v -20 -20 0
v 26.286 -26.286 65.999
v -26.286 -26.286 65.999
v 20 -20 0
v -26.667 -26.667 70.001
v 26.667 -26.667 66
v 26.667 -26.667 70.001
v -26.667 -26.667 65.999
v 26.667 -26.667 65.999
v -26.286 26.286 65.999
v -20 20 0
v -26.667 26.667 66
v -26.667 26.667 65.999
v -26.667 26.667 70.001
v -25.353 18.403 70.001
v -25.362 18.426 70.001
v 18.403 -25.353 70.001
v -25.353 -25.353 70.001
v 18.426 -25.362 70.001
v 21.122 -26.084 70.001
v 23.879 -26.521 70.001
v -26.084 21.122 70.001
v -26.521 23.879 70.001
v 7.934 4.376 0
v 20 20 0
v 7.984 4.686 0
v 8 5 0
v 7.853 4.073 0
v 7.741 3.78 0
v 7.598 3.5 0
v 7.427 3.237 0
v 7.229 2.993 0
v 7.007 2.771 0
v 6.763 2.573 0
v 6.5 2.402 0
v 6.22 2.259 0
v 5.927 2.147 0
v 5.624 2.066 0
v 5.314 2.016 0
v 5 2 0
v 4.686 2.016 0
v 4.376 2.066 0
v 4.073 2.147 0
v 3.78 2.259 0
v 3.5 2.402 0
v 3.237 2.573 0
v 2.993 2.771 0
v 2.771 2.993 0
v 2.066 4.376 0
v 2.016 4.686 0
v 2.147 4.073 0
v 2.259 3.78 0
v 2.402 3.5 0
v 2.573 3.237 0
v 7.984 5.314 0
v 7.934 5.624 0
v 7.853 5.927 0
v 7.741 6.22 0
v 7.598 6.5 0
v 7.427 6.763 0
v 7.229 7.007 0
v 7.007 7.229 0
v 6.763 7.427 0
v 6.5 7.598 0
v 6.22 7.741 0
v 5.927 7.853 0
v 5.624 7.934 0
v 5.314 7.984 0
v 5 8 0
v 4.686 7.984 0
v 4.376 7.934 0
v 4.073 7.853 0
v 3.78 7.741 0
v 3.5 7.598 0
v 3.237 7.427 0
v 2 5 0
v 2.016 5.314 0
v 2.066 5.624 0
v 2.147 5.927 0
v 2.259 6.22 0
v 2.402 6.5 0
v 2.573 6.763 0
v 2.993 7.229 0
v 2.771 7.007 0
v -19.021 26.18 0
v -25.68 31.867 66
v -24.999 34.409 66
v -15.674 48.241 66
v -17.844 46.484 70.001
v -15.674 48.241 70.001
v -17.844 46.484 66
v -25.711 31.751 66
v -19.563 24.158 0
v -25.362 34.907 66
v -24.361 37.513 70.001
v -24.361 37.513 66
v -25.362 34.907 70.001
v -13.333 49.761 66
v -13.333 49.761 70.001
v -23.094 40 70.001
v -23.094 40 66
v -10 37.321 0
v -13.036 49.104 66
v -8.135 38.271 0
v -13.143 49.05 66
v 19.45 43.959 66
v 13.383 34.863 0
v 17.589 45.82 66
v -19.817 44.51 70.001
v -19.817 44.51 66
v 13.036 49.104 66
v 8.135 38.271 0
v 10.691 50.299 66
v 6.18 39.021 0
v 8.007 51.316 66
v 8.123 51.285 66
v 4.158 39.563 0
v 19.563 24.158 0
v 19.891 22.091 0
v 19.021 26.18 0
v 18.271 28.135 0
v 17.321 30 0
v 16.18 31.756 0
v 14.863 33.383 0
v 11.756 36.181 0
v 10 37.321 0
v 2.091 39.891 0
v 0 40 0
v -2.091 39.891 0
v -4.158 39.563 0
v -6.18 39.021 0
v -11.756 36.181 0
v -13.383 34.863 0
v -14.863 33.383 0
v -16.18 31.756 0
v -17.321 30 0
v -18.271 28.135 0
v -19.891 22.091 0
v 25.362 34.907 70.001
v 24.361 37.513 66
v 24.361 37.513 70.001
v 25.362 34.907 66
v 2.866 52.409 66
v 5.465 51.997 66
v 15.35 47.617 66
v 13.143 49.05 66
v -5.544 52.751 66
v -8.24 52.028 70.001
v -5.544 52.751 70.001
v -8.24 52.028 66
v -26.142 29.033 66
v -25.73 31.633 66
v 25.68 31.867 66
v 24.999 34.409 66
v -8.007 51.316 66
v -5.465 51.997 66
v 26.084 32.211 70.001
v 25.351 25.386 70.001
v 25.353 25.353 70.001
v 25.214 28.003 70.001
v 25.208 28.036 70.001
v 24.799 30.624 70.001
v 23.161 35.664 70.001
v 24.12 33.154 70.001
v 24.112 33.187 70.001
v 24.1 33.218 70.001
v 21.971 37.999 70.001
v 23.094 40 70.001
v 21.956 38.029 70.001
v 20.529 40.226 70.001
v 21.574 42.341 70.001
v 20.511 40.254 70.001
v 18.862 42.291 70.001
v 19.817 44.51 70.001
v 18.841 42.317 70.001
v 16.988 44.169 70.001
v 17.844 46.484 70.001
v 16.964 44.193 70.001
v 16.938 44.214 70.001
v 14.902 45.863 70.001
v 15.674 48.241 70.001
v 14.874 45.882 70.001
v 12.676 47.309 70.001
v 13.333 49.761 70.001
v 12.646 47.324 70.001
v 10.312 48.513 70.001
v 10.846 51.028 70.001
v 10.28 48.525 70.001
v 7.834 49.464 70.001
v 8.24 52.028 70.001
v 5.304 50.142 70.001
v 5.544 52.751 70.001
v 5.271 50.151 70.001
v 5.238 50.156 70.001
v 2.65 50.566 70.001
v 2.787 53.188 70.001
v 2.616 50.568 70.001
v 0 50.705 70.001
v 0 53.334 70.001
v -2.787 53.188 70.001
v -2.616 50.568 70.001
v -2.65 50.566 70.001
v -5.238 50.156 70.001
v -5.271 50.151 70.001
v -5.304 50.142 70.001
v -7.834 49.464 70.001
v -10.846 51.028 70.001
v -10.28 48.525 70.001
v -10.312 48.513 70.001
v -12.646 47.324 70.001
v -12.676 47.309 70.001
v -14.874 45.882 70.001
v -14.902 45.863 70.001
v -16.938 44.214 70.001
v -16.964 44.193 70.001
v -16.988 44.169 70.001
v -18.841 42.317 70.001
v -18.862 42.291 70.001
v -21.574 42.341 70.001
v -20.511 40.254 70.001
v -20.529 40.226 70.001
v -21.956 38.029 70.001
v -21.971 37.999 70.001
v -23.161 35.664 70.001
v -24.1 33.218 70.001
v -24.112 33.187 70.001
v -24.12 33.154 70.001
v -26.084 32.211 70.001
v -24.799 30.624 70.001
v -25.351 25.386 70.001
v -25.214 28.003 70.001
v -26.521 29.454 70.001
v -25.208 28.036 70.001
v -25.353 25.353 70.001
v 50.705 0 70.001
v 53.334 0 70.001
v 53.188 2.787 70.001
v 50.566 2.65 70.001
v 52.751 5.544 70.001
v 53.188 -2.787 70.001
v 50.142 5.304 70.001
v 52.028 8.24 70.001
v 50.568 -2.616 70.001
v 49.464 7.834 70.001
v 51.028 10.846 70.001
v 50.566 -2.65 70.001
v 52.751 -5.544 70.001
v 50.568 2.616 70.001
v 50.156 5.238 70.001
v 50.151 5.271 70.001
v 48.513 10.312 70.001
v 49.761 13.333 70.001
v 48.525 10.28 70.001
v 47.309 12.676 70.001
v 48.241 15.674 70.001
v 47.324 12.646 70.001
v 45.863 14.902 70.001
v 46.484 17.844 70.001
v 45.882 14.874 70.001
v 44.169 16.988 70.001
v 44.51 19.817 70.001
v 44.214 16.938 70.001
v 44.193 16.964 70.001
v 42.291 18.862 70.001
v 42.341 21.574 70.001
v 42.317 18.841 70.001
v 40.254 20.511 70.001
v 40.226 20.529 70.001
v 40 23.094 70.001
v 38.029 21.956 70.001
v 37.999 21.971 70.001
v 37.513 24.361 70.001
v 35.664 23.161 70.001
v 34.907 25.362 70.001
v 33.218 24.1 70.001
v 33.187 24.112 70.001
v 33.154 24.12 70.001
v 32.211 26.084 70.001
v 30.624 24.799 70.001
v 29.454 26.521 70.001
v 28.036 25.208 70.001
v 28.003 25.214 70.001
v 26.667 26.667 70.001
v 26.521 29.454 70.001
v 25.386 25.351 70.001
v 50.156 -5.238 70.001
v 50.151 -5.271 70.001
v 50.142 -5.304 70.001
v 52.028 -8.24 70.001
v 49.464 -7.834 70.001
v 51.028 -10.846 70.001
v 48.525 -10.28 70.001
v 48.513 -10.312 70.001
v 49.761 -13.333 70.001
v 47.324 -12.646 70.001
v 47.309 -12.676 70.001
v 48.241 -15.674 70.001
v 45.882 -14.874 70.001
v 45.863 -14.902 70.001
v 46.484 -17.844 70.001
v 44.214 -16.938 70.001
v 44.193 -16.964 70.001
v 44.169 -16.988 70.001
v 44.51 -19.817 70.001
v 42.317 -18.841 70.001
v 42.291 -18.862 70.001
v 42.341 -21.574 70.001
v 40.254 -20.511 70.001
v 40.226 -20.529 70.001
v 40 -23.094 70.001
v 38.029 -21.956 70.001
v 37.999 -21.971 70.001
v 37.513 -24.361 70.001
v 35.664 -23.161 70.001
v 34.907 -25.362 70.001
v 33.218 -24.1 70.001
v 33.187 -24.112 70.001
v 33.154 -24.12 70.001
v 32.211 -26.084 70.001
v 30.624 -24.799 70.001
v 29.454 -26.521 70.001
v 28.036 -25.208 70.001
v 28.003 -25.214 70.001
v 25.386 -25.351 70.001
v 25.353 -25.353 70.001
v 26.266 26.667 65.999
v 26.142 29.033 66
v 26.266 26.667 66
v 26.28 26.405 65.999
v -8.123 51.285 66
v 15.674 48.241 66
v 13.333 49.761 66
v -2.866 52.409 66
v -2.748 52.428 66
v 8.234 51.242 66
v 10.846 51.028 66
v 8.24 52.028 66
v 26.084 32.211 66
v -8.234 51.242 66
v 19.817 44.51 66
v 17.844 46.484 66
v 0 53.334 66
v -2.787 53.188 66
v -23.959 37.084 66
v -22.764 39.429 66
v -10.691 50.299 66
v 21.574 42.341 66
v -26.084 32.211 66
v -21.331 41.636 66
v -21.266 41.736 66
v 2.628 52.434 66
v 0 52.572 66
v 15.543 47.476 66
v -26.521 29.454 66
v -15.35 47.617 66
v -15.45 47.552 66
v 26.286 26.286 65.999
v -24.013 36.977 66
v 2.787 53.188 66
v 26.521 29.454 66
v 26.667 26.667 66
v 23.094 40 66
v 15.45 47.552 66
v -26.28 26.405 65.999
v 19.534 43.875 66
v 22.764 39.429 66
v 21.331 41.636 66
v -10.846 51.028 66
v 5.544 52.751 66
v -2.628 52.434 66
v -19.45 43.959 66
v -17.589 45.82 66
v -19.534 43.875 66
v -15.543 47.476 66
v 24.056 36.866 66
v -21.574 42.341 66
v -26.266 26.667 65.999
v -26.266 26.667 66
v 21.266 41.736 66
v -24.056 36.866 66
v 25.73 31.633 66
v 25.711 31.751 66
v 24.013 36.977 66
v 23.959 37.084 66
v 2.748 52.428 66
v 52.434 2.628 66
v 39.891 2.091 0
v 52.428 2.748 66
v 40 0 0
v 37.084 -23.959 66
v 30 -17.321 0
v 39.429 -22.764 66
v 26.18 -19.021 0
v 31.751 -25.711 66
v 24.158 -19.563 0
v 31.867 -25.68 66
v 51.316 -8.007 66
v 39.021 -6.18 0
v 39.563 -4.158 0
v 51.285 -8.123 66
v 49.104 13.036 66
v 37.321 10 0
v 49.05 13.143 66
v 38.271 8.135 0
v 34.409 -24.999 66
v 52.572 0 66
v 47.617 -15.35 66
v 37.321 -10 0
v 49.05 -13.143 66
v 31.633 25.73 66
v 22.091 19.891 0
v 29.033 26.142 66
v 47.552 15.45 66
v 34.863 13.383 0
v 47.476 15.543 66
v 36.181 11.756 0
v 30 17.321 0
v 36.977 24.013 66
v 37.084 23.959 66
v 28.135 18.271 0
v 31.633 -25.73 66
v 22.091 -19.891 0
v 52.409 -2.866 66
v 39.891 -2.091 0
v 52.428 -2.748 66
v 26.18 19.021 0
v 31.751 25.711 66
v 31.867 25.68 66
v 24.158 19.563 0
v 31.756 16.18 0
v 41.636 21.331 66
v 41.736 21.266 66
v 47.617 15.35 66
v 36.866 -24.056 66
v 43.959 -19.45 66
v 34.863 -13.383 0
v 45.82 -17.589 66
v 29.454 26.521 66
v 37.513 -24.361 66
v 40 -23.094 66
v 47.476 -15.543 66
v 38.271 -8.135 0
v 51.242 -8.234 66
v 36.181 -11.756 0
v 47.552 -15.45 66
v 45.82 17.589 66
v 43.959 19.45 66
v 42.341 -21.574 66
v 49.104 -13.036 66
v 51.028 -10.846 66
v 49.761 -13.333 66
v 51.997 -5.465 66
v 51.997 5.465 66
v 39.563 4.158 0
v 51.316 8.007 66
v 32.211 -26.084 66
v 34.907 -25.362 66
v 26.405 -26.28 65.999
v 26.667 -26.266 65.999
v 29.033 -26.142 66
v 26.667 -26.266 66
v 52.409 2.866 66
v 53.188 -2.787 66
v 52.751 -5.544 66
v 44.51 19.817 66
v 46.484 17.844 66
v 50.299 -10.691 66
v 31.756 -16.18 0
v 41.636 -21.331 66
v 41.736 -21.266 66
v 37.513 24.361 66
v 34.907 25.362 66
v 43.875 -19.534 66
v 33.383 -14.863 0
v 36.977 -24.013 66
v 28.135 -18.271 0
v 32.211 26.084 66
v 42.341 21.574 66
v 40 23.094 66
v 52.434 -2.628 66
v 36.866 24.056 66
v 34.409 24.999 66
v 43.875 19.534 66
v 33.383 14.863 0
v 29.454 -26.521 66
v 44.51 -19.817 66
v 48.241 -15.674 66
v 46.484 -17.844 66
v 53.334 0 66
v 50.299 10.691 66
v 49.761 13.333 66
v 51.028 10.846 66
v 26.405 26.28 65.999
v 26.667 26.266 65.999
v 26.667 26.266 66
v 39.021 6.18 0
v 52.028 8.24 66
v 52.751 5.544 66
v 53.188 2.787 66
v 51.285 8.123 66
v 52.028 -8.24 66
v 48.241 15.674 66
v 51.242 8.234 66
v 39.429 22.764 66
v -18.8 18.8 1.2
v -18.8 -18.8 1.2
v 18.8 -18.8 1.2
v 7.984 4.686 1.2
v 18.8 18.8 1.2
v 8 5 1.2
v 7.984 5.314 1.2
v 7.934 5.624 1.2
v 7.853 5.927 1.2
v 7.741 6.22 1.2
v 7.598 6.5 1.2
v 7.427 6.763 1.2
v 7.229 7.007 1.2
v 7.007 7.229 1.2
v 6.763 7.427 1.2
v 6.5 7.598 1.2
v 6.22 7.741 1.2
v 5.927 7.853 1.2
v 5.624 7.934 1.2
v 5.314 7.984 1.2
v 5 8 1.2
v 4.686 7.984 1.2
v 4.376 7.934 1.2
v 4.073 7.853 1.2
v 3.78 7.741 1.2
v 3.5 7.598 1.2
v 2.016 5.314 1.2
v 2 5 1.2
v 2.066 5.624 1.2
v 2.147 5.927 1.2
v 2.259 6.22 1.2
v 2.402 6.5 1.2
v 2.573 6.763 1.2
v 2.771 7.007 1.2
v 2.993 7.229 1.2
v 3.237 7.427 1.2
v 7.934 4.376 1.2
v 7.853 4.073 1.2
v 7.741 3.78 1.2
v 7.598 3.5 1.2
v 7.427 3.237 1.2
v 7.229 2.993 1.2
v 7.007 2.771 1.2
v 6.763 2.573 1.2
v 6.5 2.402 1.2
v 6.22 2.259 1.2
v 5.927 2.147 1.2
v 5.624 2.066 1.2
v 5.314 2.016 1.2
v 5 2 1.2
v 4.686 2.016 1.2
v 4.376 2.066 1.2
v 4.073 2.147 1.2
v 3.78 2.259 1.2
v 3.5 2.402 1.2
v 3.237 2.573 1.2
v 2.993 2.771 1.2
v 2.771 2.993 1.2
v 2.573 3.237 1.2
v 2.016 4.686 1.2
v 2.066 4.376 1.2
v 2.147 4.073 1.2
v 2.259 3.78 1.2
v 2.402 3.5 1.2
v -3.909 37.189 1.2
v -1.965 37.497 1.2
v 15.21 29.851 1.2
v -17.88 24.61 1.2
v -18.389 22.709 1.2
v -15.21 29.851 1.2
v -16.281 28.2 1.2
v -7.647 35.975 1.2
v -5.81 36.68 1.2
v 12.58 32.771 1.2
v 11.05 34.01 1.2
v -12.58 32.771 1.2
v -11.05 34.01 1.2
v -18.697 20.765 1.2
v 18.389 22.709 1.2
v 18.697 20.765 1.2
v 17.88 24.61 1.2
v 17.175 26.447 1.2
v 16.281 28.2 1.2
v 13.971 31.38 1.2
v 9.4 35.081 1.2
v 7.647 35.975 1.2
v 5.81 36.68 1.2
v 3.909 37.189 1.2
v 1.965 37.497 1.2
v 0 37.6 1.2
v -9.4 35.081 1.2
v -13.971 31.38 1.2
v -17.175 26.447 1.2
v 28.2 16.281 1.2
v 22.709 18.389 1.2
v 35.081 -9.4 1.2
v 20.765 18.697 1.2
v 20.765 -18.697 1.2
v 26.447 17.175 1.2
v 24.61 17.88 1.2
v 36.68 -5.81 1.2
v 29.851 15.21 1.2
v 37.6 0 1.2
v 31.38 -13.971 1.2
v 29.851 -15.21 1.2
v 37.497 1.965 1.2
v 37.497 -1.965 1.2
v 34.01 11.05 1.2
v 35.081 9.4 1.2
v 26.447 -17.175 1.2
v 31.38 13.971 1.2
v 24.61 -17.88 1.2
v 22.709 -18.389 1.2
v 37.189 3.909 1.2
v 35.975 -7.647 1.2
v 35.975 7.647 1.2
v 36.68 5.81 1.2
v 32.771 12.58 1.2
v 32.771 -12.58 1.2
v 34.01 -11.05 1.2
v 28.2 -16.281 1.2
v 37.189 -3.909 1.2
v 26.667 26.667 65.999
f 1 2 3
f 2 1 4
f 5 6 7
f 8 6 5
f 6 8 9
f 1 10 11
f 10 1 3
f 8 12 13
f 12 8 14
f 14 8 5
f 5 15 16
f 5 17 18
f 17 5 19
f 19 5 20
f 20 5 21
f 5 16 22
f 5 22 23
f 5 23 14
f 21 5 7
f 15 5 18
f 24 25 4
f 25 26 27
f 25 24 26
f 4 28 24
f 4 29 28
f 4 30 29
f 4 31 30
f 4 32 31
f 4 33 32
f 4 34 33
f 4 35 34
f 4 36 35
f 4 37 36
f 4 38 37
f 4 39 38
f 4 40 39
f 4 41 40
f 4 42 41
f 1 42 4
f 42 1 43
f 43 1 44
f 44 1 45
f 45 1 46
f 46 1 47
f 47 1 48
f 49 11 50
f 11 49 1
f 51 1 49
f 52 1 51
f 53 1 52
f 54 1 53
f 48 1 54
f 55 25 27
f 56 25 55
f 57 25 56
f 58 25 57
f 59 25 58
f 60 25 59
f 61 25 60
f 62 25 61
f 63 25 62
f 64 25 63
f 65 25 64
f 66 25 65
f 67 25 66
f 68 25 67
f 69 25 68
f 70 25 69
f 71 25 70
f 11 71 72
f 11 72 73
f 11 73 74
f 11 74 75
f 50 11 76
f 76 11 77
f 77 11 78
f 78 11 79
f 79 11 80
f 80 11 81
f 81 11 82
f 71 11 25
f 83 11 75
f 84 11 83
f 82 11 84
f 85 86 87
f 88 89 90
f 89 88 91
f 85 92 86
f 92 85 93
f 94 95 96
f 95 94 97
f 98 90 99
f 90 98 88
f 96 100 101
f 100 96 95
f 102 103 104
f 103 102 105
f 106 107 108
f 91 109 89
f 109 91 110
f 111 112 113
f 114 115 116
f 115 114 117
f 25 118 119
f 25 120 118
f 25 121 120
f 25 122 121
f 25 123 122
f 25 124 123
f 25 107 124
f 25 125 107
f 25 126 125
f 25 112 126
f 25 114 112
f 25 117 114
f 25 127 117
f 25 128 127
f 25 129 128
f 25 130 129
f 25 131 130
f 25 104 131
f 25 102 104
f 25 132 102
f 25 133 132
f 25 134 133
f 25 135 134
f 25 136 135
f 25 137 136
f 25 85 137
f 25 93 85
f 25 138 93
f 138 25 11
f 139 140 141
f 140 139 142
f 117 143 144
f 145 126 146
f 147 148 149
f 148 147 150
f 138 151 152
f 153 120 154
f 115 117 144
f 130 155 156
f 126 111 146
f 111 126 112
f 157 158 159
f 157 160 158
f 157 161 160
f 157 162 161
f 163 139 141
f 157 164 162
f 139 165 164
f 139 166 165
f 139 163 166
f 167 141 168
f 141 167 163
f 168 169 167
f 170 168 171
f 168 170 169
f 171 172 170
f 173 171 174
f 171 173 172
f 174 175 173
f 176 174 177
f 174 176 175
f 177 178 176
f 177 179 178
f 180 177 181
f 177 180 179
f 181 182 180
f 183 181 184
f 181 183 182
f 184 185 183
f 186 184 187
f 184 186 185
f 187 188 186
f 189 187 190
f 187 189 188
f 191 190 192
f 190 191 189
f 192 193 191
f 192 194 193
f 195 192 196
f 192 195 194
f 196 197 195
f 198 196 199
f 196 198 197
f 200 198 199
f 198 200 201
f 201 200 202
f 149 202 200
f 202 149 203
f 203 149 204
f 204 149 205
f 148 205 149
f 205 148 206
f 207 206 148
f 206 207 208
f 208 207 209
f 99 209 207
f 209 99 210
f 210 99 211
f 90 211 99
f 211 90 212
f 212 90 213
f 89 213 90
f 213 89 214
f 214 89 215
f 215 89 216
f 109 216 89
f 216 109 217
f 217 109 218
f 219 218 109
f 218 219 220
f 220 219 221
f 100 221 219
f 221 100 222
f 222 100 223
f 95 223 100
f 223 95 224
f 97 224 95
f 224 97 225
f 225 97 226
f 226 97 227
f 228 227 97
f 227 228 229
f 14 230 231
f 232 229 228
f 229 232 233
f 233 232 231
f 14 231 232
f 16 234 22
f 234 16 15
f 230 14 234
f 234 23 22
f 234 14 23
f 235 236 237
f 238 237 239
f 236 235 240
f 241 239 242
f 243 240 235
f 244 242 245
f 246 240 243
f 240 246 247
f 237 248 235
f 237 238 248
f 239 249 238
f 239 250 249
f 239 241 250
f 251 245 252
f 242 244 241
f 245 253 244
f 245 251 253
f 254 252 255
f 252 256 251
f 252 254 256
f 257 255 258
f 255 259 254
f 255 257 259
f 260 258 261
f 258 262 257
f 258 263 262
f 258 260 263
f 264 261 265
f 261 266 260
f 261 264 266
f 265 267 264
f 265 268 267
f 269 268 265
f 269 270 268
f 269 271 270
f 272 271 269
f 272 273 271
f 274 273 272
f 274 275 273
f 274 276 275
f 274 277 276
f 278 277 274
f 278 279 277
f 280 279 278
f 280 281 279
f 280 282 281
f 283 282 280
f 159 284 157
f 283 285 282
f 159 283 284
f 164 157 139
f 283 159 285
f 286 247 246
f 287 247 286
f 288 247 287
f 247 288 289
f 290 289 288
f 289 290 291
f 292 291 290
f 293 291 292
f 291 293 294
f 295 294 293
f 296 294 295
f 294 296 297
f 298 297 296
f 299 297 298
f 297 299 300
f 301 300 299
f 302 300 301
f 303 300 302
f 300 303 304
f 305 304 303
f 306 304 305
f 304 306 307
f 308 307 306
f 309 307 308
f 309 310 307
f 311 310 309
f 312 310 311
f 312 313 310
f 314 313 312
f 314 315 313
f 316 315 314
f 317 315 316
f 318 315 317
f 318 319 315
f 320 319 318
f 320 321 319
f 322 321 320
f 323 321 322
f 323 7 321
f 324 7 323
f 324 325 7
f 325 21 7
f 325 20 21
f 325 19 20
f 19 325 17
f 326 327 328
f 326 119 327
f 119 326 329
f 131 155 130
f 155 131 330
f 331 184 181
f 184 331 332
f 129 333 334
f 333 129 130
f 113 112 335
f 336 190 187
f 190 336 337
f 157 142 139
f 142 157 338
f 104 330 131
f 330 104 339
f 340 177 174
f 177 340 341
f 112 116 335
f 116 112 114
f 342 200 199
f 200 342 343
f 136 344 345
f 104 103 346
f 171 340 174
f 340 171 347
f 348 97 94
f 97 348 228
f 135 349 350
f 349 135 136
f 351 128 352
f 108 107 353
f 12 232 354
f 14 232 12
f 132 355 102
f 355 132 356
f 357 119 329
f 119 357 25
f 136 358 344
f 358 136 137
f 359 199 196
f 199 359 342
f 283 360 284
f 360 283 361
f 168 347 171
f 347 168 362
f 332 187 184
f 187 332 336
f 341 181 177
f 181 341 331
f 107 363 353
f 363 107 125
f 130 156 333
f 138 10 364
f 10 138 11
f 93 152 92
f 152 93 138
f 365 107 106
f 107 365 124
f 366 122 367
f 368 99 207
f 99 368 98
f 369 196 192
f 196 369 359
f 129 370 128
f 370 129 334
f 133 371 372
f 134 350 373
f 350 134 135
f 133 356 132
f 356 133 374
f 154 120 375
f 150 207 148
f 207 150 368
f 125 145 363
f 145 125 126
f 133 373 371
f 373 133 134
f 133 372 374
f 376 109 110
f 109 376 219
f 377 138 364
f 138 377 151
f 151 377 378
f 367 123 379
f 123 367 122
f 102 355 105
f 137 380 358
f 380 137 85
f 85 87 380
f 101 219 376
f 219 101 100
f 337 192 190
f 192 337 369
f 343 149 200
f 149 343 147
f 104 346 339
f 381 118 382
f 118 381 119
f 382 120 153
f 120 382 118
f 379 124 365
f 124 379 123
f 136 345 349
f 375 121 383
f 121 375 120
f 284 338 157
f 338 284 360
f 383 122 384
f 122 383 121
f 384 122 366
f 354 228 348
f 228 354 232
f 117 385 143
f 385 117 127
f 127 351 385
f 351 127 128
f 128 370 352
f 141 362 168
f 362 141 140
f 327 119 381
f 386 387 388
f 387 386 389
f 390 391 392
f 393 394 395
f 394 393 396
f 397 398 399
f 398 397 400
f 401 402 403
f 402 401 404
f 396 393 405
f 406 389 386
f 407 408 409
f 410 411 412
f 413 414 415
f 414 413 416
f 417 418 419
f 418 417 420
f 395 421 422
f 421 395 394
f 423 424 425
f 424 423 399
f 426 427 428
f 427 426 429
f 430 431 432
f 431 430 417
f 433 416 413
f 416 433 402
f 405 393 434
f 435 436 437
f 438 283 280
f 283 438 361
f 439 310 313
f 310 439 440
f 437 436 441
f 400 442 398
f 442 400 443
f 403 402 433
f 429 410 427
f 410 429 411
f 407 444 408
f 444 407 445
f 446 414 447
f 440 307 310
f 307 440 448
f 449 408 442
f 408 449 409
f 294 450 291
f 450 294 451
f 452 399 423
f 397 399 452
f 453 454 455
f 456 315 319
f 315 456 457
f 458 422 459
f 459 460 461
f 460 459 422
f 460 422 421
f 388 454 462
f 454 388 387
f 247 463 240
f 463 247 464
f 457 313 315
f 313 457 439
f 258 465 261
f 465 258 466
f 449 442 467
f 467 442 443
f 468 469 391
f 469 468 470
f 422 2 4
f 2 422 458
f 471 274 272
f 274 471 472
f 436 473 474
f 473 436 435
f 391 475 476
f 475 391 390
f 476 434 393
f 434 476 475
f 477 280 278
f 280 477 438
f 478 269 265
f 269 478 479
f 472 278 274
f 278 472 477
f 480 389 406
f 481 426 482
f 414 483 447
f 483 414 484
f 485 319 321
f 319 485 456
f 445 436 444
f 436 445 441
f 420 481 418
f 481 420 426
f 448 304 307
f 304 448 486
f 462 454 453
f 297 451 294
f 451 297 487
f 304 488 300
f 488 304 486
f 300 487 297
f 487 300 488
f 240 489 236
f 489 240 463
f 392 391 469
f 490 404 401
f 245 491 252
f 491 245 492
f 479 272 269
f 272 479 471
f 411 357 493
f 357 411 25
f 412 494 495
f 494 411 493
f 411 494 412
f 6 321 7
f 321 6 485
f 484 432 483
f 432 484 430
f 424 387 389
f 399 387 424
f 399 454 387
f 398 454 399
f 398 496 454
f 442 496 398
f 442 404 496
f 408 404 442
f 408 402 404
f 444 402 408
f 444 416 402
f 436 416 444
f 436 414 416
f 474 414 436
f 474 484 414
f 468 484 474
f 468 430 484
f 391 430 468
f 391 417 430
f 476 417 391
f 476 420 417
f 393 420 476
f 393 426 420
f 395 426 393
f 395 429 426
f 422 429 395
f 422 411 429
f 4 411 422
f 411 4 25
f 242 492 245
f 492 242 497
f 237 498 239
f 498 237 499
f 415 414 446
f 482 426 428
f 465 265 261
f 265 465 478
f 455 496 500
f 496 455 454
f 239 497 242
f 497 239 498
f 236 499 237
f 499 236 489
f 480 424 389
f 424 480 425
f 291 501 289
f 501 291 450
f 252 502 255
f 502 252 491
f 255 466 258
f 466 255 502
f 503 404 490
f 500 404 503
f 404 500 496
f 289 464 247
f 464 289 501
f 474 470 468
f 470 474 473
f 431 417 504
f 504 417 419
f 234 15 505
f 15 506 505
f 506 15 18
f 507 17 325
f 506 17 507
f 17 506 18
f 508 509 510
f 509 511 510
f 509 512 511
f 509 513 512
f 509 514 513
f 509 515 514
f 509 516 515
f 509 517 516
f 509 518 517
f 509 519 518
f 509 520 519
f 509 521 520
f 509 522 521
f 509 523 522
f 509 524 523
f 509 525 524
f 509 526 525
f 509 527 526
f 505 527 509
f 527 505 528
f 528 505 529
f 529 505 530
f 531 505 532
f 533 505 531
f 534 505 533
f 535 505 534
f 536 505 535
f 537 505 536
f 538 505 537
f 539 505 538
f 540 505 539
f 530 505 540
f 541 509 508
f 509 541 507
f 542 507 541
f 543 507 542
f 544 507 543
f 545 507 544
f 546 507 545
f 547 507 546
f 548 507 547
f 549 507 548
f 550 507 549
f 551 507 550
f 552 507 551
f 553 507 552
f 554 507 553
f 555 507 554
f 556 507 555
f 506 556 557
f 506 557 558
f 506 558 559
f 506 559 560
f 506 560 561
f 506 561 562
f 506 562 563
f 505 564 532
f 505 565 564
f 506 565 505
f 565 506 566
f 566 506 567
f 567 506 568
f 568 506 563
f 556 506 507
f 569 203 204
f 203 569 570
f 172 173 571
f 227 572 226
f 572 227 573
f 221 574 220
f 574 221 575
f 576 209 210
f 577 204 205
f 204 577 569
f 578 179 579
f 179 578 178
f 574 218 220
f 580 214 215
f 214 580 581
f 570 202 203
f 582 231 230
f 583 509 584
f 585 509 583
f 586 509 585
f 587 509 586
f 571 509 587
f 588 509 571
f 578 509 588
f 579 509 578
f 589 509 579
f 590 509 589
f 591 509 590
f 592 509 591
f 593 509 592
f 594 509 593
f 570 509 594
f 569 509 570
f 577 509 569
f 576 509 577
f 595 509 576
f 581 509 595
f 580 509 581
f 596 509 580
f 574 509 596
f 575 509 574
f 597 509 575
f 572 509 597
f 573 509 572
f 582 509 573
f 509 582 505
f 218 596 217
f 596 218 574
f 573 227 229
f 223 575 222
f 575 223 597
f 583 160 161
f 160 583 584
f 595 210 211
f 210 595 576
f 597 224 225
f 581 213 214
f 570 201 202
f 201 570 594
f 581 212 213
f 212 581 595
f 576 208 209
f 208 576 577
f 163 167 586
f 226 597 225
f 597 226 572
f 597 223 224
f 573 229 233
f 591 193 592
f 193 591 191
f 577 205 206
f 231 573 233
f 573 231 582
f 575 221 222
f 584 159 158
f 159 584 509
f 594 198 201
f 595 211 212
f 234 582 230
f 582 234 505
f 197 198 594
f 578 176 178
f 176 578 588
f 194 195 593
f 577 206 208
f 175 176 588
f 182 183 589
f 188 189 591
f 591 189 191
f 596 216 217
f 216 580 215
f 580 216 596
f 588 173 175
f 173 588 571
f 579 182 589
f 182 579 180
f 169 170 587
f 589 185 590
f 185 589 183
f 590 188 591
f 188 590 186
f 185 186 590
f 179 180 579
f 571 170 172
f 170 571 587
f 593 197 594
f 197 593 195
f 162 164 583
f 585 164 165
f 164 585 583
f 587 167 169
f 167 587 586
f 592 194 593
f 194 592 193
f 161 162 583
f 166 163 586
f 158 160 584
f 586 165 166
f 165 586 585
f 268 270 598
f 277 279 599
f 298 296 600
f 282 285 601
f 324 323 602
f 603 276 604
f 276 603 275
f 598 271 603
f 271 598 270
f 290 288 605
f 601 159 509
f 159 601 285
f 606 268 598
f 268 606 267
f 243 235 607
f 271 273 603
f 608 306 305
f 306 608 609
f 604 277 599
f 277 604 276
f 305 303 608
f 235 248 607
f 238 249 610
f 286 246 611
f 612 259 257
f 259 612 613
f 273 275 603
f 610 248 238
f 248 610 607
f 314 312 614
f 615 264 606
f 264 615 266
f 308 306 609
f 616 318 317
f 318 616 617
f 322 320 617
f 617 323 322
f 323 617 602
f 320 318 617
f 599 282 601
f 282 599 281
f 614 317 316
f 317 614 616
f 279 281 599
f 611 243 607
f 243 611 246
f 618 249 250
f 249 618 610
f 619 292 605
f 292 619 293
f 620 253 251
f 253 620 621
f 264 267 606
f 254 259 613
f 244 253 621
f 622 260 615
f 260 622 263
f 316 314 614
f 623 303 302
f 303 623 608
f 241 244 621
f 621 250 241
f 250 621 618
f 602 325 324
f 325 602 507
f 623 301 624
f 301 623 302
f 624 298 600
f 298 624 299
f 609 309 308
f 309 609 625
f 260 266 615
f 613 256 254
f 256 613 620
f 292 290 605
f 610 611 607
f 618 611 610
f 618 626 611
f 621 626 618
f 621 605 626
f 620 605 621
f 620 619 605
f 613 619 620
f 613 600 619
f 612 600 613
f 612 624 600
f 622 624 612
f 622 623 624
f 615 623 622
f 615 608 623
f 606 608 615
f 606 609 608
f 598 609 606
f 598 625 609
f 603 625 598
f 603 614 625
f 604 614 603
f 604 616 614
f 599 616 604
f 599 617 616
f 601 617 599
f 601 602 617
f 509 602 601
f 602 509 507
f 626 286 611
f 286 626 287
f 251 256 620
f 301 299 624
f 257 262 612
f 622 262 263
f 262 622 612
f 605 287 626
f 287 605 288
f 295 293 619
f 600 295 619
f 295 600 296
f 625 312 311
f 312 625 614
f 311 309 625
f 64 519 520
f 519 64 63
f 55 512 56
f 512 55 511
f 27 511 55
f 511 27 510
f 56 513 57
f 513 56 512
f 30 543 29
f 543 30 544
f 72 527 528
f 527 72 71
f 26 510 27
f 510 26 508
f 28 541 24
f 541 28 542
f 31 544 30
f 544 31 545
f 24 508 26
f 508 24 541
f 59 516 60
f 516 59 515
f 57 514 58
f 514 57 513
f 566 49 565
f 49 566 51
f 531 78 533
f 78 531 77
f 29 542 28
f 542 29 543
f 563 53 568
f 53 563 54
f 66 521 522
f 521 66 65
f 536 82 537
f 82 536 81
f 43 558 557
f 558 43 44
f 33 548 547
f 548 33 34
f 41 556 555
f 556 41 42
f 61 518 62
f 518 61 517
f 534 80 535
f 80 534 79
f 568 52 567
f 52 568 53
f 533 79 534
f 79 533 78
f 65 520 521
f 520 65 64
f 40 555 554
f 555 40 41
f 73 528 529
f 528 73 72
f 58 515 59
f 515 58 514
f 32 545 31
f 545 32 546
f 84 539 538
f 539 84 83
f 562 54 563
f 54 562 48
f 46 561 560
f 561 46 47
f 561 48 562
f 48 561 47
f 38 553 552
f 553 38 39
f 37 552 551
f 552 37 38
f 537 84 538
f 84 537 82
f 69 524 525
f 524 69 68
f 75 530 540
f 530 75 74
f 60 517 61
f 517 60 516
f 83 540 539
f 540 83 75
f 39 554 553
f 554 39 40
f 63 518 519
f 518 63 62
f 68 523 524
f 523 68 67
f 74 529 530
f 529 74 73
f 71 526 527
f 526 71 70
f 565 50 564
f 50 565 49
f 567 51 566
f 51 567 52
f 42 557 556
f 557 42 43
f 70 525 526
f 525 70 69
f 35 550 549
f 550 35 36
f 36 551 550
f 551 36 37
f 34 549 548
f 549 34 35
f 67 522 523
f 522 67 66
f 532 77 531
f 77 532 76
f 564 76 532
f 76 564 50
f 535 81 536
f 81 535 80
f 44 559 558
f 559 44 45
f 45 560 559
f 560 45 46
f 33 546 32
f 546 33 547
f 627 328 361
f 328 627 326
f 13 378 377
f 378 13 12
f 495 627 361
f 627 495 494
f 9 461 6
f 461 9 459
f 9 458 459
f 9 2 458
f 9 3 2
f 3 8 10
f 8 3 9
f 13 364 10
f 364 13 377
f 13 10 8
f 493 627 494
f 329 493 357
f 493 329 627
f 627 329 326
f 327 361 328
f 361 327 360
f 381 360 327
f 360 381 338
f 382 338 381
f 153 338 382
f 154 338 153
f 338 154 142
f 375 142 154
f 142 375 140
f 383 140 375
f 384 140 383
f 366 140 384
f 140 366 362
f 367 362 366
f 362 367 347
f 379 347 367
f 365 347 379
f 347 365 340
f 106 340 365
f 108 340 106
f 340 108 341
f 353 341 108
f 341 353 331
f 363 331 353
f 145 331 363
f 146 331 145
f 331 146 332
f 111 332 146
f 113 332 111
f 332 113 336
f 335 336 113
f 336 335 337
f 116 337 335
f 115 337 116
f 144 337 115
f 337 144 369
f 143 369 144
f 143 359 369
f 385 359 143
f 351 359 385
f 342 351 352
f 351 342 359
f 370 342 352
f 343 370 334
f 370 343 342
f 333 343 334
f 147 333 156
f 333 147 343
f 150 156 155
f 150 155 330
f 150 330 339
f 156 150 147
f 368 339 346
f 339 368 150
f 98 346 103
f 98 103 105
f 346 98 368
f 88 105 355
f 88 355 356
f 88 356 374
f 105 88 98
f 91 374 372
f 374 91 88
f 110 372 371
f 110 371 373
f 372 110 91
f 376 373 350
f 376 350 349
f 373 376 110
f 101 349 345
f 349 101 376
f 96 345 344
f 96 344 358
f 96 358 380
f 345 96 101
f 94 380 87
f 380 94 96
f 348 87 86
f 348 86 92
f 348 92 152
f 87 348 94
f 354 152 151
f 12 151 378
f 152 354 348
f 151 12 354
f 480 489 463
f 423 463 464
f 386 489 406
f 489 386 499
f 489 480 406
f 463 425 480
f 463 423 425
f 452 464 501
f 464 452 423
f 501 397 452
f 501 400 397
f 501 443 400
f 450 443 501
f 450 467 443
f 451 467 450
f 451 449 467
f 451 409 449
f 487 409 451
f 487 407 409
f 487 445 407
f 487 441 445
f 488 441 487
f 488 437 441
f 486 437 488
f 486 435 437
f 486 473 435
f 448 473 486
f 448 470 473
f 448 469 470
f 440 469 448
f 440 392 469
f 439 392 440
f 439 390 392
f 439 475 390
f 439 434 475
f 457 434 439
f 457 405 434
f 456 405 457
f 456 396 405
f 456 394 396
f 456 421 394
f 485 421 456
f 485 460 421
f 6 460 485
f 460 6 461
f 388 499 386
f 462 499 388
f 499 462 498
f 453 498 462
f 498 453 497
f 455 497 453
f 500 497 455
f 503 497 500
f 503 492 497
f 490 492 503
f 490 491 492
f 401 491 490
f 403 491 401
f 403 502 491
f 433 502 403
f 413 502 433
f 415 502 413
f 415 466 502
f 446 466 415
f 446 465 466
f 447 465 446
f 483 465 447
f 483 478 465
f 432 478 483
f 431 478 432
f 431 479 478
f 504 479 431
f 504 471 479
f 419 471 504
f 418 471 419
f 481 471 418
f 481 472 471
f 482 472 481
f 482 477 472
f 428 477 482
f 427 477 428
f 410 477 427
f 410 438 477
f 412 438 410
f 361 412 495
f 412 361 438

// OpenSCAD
// heart-planter
// lucina
// 2019-02-08
/* [planter settings] */
// which part
whichPart = "planter";  //[planter, saucer, both]
// height in mm
height = 70;  //[20:5:200]
// bottom width in mm
bottom = 60;   //[20:5:200]
// top width in mm
top = 80;   //[20:5:200]
// wall size in mm
wall = 1.2; //[.6:.1:3]
// drain hole size in mm (0=no hole)
hole = 6;   //[0:1:10]
// slant top angle
slant = 0; // [0:40]
// saucerHeight in mm
saucerHeight = 8;  //[8:30]

/* [Hidden] */
$fn = 60;
x = 0; y = 1; z = 2;
bb = .66667 * bottom;
tt = .66667 * top;

module fcube(x, y, z, rad) {
   translate([rad-x/2, rad-y/2, rad-z/2])
      minkowski() {
         cube([x-2*rad, y-2*rad, z-2*rad]);
         sphere(rad);
      }
}
module taperHeart(t, b, hh) {
   union() {
      hull() {
         cube([b, b, .001], center=true);
         translate([0, 0, hh])
            cube([t, t, .001], center=true);
      }
      hull() {
         translate([0, b/2.0, 0])
            cylinder(h=.001, d=b);
         translate([0, t/2.0, hh])
            cylinder(h=.001, d=t);
      }
      hull() {
         translate([b/2, 0, 0])
            cylinder(h=.001, d=b);
         translate([t/2, 0, hh])
            cylinder(h=.001, d=t);
      }
   }
}
module heart(size, hh) {
//   translate([-.25*size, -.25*size, 0])
   union() {
      cube([size, size, hh]);
      translate([0, size/2.0, 0])
         cylinder(h=hh, d=size);
      translate([size/2.0, 0, 0])
         cylinder(h=hh, d=size);
   }
}
module slantedPlanter() {
   // planter
   rotate([0, 0, -45])
   translate([0, .57*top, height])
      rotate([slant, 0, 0])
         difference() {
            rotate([-slant, 0, 0])
             translate([0, -.57*top, -height])
               rotate([0, 0, 45])
                 // hollow and drain hole
                 difference() {
                     taperHeart(tt, bb, height);
                     union() {
                        translate([0, 0, wall])
                           taperHeart(tt-2*wall, bb-2*wall, height);
                        translate([.125*bb, .125*bb, -wall])
                           cylinder(h=3*wall, d=hole);
                     }
                  }
            // for slanting
            translate([0, 0, height/2])
            cube([1000, 1000, height], center=true);
         }      
}
module planter() {
  difference() {
      taperHeart(tt, bb, height);
      union() {
         translate([0, 0, wall])
            taperHeart(tt-2*wall, bb-2*wall, height);
         translate([.125*bb, .125*bb, -wall])
            cylinder(h=3*wall, d=hole);
      }
   }
   // top band
   translate([0, 0, height-4])
      difference() {
         taperHeart(tt, tt, 4);
         translate([0, 0, -2])
            taperHeart(tt-2*wall, tt-2*wall, 8);
      }
}
module saucer() {
   intersection() {
      cylinder(h=saucerHeight, d=max(top, bottom)*3);
      difference() {
         taperHeart(tt+4, bb+4, height);
         translate([0, 0, wall])
            taperHeart((tt+4)-2*wall, (bb+4)-2*wall, height);
      }
   }
}
module doPlanter() {
   if ( slant == 0 )
      planter();
   else
      slantedPlanter();
}
if ( whichPart == "planter" ) {
   doPlanter();
}
if ( whichPart == "saucer" )
   saucer();
if ( whichPart == "both" )
   union() {
      doPlanter();
      translate([max(top, bottom)+3, 0, 0])
         saucer();
   }
if ( whichPart == "stick" ) {
   heart = [40, 40, 3];
   stick = [4, 80, 3];
   rr = heart[z]/2 - .0001;
   
   rotate([0, 0, -135])
      minkowski() {
         heart(heart[x]*.6667-2*rr, heart[z]-2*rr);
         sphere(rr);
      }
   translate([0, -stick[y]/2-heart[y]+8, 0])
      fcube(stick[x], stick[y], stick[z], stick[z]/2-.0001);
}
